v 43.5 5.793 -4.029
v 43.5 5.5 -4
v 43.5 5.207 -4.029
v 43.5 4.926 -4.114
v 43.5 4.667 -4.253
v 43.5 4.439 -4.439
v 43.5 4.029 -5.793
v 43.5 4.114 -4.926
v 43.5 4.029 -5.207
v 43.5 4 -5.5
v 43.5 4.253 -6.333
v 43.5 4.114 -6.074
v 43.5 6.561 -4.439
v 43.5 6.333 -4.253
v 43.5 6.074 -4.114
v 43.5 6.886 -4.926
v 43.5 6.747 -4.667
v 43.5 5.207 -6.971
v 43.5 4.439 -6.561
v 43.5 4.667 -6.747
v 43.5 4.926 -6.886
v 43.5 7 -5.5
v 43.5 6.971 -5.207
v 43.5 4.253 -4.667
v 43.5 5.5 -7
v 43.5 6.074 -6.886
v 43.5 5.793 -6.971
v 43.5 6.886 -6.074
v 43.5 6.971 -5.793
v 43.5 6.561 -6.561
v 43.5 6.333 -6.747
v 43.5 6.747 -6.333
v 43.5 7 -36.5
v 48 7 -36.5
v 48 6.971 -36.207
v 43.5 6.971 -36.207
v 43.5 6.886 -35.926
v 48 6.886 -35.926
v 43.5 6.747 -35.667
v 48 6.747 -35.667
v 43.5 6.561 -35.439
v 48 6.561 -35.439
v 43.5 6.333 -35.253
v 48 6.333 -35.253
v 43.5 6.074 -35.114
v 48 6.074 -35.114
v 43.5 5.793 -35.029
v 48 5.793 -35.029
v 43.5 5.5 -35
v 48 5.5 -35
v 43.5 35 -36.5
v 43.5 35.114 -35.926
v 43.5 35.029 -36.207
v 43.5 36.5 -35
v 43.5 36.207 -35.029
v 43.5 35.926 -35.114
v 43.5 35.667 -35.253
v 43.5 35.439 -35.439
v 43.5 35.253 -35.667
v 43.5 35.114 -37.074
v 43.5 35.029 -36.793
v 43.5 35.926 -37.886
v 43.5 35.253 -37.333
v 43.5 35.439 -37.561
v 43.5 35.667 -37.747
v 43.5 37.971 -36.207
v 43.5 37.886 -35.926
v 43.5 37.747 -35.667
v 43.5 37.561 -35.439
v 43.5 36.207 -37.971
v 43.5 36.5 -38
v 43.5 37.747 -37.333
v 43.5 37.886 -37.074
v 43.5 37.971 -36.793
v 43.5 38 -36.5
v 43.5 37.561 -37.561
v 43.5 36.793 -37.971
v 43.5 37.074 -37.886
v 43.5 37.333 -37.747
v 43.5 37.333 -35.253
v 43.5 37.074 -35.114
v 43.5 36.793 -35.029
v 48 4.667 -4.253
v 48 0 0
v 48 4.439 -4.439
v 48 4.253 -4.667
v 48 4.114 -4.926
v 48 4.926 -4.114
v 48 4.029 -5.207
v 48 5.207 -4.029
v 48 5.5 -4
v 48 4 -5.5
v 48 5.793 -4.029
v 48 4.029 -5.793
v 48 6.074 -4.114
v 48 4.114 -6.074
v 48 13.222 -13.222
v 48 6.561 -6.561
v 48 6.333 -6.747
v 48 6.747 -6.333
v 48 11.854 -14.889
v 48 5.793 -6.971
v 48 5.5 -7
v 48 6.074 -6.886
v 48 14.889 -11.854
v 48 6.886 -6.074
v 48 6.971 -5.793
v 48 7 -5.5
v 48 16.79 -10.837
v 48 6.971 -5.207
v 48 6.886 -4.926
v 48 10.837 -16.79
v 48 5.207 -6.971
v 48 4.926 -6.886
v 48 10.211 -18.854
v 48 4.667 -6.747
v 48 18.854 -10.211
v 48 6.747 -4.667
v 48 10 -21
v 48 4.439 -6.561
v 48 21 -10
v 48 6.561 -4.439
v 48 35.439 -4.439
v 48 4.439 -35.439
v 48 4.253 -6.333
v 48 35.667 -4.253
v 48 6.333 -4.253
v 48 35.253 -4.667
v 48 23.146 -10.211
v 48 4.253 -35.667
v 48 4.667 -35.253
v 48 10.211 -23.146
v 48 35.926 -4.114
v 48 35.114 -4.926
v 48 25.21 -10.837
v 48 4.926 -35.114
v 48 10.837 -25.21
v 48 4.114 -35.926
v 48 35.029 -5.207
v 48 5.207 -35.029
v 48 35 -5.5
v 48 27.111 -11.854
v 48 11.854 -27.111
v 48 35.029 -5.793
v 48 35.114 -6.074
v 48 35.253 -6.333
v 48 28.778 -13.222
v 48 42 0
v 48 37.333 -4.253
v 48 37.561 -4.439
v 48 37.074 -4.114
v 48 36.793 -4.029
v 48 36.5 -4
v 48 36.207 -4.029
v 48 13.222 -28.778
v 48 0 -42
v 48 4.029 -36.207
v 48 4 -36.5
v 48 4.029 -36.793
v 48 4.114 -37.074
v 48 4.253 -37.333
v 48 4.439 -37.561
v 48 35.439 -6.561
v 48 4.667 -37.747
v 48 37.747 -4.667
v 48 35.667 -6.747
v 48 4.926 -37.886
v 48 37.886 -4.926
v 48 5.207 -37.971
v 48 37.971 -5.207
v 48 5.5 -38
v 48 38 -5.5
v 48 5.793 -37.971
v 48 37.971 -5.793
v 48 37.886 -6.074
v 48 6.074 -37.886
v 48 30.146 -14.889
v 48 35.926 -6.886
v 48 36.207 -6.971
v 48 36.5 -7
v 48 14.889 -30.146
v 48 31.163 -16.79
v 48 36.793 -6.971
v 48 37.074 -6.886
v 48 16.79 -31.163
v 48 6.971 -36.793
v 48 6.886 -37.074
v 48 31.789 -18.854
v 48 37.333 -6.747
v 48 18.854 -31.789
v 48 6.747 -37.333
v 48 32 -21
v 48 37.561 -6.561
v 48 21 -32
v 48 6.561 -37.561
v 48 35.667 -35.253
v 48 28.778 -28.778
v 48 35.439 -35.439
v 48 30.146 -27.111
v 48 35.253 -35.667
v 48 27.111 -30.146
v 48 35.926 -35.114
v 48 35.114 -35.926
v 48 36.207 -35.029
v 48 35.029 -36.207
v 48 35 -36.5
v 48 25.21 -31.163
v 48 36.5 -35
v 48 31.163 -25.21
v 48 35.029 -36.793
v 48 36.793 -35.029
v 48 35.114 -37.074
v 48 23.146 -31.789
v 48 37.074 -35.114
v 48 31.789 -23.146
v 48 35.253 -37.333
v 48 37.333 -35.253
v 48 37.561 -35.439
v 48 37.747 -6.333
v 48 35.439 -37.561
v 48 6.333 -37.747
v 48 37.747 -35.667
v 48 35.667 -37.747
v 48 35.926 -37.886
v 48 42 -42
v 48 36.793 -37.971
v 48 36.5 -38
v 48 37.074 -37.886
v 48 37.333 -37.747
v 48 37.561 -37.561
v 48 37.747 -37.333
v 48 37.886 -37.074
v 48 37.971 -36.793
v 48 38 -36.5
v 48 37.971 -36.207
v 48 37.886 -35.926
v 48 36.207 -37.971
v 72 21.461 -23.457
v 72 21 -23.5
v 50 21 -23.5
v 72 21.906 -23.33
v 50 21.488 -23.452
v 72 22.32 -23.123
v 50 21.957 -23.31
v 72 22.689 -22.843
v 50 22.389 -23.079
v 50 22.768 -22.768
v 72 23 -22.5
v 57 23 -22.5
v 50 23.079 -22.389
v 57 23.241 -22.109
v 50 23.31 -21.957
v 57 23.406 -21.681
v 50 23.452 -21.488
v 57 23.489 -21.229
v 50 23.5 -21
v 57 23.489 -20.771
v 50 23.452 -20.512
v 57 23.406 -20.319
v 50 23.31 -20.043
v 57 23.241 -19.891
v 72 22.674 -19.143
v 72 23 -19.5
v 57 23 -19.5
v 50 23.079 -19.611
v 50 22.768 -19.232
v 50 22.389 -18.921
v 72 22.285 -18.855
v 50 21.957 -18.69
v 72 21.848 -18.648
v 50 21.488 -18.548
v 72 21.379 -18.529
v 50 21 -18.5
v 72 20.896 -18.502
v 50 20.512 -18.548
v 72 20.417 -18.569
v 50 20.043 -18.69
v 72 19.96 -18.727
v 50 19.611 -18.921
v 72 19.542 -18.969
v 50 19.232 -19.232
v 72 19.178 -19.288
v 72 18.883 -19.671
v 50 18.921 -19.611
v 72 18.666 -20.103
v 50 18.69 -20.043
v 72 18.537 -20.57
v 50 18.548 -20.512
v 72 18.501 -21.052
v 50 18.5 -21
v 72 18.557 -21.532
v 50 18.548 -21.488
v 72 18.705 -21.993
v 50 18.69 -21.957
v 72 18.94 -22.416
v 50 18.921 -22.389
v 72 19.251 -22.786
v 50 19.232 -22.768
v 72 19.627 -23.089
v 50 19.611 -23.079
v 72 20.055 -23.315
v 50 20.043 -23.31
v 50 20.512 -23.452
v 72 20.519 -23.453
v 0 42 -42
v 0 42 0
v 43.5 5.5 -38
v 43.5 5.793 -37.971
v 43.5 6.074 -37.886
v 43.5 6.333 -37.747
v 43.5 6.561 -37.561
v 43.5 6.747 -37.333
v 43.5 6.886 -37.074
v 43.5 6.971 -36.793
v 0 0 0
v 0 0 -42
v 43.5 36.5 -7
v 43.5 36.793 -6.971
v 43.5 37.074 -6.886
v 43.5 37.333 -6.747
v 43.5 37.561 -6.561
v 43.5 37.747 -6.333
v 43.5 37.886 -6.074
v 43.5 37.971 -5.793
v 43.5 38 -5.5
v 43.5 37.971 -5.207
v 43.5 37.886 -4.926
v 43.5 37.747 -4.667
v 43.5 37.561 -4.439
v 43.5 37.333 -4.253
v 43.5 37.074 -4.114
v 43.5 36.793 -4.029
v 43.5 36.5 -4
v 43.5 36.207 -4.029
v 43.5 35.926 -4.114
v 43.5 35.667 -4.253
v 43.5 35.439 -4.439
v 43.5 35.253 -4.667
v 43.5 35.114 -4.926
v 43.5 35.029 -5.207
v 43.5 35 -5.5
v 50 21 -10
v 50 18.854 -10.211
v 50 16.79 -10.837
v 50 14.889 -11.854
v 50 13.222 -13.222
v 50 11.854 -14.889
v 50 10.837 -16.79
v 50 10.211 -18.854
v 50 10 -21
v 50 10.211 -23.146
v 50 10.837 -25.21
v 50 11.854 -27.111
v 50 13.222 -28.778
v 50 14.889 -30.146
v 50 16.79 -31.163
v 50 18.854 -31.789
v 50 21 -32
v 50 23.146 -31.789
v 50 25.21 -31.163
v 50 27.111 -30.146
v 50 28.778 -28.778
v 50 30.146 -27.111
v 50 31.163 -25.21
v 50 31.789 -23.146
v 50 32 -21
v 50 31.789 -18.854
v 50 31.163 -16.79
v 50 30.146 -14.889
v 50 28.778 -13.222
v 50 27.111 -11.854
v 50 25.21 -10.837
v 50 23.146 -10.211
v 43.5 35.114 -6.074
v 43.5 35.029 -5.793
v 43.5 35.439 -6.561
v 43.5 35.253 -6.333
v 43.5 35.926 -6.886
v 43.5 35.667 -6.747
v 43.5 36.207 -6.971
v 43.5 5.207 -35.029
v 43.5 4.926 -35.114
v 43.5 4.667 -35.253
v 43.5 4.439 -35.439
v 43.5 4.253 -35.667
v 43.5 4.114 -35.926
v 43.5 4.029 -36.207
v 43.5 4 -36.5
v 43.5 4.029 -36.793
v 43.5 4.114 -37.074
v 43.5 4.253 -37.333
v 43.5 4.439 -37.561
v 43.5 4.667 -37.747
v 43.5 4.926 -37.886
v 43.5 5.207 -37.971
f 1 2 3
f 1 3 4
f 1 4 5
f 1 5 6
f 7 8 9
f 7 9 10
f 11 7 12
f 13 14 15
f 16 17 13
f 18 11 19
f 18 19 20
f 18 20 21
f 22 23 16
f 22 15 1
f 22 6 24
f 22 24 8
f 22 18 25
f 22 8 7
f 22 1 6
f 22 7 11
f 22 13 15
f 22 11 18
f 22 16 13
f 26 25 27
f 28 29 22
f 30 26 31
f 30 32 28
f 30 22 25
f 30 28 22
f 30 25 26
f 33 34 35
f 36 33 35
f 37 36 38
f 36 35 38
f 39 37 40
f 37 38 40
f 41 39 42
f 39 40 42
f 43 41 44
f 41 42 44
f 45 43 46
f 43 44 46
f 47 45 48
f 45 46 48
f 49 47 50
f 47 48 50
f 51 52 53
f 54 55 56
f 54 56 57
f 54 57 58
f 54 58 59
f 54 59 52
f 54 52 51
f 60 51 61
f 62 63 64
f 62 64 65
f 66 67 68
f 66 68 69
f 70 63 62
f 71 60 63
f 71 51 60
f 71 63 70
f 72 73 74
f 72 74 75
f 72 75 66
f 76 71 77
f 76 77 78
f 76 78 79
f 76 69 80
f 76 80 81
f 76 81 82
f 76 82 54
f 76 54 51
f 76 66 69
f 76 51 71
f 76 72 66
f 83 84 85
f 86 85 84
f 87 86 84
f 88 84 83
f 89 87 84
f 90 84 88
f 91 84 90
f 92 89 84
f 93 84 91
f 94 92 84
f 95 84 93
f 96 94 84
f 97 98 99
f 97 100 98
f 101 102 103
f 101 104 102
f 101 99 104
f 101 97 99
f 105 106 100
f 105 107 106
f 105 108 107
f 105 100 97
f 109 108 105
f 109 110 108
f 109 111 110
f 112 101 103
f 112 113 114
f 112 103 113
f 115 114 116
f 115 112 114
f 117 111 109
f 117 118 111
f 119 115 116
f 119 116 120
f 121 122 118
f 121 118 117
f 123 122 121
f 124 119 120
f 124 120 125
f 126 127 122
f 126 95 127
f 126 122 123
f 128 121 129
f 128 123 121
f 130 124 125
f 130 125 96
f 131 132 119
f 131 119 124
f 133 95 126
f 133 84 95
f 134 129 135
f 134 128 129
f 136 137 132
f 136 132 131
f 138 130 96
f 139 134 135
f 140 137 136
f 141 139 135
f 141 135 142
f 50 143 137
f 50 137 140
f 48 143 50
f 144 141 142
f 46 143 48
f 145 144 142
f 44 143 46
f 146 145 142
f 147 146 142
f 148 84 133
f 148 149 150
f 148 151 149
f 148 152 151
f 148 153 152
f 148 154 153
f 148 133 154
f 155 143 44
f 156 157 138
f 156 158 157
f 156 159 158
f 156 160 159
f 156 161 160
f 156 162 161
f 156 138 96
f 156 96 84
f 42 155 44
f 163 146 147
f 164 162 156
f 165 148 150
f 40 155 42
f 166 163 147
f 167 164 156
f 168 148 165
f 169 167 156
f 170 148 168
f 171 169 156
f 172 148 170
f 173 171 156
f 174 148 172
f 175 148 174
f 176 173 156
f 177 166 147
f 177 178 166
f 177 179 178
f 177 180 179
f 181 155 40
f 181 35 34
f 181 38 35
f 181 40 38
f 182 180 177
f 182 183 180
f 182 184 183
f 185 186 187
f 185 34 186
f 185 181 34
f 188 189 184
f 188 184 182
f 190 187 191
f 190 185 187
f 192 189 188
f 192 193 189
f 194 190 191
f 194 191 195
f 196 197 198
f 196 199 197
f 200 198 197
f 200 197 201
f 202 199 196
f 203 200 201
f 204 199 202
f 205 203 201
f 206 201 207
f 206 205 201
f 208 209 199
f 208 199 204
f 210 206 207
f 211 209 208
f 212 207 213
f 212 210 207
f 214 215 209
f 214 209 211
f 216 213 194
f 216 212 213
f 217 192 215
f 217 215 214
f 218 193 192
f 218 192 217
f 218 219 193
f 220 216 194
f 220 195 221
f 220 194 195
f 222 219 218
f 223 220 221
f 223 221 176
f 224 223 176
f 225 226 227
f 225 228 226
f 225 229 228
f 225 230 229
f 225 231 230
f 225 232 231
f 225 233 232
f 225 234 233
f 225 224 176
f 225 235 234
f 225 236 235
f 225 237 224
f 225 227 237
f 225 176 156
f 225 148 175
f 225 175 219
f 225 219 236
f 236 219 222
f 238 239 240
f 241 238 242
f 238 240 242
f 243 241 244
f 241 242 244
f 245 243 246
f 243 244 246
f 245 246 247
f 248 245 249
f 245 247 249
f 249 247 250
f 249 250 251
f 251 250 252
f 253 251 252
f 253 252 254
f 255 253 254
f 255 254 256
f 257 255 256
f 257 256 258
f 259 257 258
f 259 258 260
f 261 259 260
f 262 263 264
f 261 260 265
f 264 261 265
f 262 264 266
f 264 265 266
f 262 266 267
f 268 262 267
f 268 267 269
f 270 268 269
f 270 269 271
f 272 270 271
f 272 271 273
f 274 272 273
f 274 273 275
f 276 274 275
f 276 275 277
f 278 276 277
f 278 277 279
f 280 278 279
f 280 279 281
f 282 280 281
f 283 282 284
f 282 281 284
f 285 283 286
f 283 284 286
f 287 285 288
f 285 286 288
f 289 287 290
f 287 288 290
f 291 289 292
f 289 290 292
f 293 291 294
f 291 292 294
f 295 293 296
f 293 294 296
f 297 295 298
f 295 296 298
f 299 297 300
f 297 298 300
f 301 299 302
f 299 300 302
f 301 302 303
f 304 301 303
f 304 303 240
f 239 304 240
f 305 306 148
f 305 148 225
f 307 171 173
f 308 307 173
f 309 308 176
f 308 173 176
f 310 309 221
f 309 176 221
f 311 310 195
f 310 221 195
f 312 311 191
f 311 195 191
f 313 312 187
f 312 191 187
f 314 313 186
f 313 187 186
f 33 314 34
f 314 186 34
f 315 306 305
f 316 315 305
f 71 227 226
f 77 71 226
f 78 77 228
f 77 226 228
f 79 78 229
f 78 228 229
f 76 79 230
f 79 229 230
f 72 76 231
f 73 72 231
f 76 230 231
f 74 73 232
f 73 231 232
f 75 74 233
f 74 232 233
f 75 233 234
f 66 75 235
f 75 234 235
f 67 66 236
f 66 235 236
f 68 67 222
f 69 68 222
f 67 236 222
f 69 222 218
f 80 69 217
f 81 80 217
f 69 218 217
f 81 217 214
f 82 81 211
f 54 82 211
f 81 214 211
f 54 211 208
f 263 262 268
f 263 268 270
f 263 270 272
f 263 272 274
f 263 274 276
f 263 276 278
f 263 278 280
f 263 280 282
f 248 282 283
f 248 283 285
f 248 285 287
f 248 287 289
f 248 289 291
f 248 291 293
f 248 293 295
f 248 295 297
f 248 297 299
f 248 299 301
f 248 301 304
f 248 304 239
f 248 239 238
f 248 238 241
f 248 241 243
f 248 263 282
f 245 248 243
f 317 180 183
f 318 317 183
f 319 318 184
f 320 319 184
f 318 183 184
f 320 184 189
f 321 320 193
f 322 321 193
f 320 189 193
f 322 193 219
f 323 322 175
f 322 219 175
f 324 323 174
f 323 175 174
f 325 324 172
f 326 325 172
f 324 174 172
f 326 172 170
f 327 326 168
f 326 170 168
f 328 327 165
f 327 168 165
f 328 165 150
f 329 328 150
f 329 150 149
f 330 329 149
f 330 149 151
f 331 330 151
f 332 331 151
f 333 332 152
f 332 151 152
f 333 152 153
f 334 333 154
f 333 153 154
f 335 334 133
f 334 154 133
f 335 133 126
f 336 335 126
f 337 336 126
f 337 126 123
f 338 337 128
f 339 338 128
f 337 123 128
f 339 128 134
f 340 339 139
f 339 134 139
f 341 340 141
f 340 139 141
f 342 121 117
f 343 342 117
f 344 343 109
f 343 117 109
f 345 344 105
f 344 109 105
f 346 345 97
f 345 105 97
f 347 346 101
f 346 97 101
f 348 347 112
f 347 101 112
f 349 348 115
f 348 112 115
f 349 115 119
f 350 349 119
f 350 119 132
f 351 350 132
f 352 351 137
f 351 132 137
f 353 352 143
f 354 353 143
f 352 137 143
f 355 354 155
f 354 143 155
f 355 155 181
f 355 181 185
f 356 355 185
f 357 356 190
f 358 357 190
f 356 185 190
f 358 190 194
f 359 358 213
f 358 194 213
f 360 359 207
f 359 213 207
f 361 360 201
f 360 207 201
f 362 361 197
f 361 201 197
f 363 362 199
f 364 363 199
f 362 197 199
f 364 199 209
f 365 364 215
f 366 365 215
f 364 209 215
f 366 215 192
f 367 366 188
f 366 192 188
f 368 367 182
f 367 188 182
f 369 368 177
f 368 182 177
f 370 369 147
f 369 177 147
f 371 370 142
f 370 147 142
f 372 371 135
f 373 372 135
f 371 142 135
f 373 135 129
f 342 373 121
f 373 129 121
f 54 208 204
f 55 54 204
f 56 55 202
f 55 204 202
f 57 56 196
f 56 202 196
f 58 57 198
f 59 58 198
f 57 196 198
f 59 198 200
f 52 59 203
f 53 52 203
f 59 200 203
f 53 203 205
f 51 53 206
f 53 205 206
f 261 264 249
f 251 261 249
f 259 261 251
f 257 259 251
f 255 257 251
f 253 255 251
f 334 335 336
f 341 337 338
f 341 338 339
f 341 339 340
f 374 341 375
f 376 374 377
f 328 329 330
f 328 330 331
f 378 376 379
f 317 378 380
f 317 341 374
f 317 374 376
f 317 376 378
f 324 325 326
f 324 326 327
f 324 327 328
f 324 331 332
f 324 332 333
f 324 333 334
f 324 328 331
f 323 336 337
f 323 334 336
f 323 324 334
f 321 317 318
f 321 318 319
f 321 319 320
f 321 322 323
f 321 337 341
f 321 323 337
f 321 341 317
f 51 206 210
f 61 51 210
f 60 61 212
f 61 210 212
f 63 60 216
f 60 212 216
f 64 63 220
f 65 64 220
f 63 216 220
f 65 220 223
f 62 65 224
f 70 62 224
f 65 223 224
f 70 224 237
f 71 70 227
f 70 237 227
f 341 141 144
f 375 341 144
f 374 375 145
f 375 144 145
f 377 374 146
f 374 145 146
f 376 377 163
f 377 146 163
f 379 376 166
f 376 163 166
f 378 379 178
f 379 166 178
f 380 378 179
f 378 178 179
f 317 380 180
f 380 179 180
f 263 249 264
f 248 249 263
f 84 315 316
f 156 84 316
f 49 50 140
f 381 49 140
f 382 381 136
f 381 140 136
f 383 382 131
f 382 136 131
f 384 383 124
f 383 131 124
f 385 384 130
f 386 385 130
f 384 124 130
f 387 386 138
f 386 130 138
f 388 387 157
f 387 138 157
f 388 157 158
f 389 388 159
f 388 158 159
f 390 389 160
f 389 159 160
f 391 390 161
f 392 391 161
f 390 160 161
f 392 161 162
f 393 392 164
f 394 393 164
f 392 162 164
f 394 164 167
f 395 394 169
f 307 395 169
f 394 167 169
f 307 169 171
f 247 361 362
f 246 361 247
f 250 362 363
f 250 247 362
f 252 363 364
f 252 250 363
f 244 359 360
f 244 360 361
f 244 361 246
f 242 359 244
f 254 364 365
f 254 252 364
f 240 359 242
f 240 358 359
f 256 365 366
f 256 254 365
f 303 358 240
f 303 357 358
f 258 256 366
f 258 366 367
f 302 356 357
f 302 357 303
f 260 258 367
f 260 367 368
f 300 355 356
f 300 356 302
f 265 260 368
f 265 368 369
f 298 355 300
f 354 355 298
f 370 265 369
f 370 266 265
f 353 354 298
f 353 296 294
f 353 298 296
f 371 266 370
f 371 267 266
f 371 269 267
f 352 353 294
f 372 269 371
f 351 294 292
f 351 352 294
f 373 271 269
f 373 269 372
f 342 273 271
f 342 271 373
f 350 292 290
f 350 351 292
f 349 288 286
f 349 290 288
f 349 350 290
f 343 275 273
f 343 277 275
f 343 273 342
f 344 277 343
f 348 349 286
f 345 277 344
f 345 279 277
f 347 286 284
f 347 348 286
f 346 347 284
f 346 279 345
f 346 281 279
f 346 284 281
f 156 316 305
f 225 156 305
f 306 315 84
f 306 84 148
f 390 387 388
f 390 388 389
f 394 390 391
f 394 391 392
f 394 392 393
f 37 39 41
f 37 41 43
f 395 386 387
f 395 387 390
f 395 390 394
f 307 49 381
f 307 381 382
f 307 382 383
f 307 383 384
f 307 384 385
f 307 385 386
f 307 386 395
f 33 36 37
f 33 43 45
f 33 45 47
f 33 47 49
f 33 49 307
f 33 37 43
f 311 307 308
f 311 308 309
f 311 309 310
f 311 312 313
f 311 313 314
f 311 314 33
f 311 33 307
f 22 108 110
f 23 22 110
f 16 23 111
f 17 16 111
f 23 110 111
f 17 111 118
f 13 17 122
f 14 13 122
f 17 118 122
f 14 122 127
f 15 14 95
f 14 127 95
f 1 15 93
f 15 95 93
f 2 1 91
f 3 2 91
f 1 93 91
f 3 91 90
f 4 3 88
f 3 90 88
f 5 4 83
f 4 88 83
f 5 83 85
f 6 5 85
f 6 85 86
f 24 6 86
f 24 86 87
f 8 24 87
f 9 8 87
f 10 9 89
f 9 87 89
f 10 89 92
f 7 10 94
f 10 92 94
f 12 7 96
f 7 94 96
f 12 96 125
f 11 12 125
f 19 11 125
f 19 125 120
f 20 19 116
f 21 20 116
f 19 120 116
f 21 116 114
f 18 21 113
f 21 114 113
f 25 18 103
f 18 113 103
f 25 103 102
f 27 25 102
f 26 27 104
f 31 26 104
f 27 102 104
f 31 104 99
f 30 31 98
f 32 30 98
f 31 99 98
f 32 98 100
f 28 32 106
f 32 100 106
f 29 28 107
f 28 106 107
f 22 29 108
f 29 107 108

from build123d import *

# Parameters (mm, degrees)
SKETCH1_W           = 42
SKETCH1_H           = 42
BOSS_EXTRUDE1_DEPTH = 48
SKETCH3_R           = 11
BOSS_EXTRUDE2_DEPTH = 2
SKETCH4_R           = 2.5
BOSS_EXTRUDE3_DEPTH = 22
SKETCH5_W           = 15
SKETCH5_H           = 9.626973265
CUT_EXTRUDE1_DEPTH  = 2
CUT_EXTRUDE2_DEPTH  = 4.5


with BuildPart() as part:
    # Sketch1 → Boss-Extrude1 (new body)
    with BuildSketch(Plane(origin=(0, 0, 0), x_dir=(0, 0, -1), z_dir=(1, 0, 0))):
        with Locations((21, 21)):
            Rectangle(SKETCH1_W, SKETCH1_H)
    extrude(amount=BOSS_EXTRUDE1_DEPTH)

    # Sketch3 → Boss-Extrude2 (add)
    with BuildSketch(Plane(origin=(48, 0, 0), x_dir=(0, 0, -1), z_dir=(1, 0, 0))):
        with Locations(Location((21, 21, 0), (0, 0, 180))):
            Circle(SKETCH3_R)
    extrude(amount=BOSS_EXTRUDE2_DEPTH)

    # Sketch4 → Boss-Extrude3 (add)
    with BuildSketch(Plane(origin=(50, 0, 0), x_dir=(0, 0, -1), z_dir=(1, 0, 0))):
        with Locations((21, 21)):
            Circle(SKETCH4_R)
    extrude(amount=BOSS_EXTRUDE3_DEPTH)

    # Sketch5 → Cut-Extrude1 (cut)
    with BuildSketch(Plane(origin=(0, 23, 0), x_dir=(1, 0, 0), z_dir=(0, 1, 0))):
        with Locations((64.5, 20.688698753)):
            Rectangle(SKETCH5_W, SKETCH5_H)
    extrude(amount=CUT_EXTRUDE1_DEPTH, mode=Mode.SUBTRACT)

    # Sketch6 → Cut-Extrude2 (cut)
    with BuildSketch(Plane(origin=(48, 0, 0), x_dir=(0, 0, -1), z_dir=(1, 0, 0))):
        with BuildLine():
            Line((5.5, 35), (5.5, 36.5))
            Line((5.5, 36.5), (7, 36.5))
            ThreePointArc((7, 36.5), (4.439339828, 37.560660172), (5.5, 35))
        make_face()
        with BuildLine():
            Line((7, 36.5), (5.5, 36.5))
            Line((5.5, 36.5), (5.5, 35))
            ThreePointArc((5.5, 35), (6.560660172, 35.439339828), (7, 36.5))
        make_face()
        with BuildLine():
            ThreePointArc((38, 36.5), (36.5, 38), (35, 36.5))
            Line((35, 36.5), (36.5, 36.5))
            Line((36.5, 36.5), (36.5, 35))
            ThreePointArc((36.5, 35), (37.560660172, 35.439339828), (38, 36.5))
        make_face()
        with BuildLine():
            Line((36.5, 36.5), (35, 36.5))
            ThreePointArc((35, 36.5), (35.439339828, 35.439339828), (36.5, 35))
            Line((36.5, 35), (36.5, 36.5))
        make_face()
        with BuildLine():
            ThreePointArc((38, 5.5), (37.560660172, 6.560660172), (36.5, 7))
            Line((36.5, 7), (36.5, 5.5))
            Line((36.5, 5.5), (35, 5.5))
            ThreePointArc((35, 5.5), (36.5, 4), (38, 5.5))
        make_face()
        with BuildLine():
            Line((36.5, 5.5), (36.5, 7))
            ThreePointArc((36.5, 7), (35.439339828, 6.560660172), (35, 5.5))
            Line((35, 5.5), (36.5, 5.5))
        make_face()
        with BuildLine():
            ThreePointArc((7, 5.5), (6.560660172, 6.560660172), (5.5, 7))
            Line((5.5, 7), (5.5, 5.5))
            Line((5.5, 5.5), (7, 5.5))
        make_face()
        with BuildLine():
            Line((5.5, 5.5), (5.5, 7))
            ThreePointArc((5.5, 7), (4.439339828, 4.439339828), (7, 5.5))
            Line((7, 5.5), (5.5, 5.5))
        make_face()
    extrude(amount=-CUT_EXTRUDE2_DEPTH, mode=Mode.SUBTRACT)


solid = part.part
